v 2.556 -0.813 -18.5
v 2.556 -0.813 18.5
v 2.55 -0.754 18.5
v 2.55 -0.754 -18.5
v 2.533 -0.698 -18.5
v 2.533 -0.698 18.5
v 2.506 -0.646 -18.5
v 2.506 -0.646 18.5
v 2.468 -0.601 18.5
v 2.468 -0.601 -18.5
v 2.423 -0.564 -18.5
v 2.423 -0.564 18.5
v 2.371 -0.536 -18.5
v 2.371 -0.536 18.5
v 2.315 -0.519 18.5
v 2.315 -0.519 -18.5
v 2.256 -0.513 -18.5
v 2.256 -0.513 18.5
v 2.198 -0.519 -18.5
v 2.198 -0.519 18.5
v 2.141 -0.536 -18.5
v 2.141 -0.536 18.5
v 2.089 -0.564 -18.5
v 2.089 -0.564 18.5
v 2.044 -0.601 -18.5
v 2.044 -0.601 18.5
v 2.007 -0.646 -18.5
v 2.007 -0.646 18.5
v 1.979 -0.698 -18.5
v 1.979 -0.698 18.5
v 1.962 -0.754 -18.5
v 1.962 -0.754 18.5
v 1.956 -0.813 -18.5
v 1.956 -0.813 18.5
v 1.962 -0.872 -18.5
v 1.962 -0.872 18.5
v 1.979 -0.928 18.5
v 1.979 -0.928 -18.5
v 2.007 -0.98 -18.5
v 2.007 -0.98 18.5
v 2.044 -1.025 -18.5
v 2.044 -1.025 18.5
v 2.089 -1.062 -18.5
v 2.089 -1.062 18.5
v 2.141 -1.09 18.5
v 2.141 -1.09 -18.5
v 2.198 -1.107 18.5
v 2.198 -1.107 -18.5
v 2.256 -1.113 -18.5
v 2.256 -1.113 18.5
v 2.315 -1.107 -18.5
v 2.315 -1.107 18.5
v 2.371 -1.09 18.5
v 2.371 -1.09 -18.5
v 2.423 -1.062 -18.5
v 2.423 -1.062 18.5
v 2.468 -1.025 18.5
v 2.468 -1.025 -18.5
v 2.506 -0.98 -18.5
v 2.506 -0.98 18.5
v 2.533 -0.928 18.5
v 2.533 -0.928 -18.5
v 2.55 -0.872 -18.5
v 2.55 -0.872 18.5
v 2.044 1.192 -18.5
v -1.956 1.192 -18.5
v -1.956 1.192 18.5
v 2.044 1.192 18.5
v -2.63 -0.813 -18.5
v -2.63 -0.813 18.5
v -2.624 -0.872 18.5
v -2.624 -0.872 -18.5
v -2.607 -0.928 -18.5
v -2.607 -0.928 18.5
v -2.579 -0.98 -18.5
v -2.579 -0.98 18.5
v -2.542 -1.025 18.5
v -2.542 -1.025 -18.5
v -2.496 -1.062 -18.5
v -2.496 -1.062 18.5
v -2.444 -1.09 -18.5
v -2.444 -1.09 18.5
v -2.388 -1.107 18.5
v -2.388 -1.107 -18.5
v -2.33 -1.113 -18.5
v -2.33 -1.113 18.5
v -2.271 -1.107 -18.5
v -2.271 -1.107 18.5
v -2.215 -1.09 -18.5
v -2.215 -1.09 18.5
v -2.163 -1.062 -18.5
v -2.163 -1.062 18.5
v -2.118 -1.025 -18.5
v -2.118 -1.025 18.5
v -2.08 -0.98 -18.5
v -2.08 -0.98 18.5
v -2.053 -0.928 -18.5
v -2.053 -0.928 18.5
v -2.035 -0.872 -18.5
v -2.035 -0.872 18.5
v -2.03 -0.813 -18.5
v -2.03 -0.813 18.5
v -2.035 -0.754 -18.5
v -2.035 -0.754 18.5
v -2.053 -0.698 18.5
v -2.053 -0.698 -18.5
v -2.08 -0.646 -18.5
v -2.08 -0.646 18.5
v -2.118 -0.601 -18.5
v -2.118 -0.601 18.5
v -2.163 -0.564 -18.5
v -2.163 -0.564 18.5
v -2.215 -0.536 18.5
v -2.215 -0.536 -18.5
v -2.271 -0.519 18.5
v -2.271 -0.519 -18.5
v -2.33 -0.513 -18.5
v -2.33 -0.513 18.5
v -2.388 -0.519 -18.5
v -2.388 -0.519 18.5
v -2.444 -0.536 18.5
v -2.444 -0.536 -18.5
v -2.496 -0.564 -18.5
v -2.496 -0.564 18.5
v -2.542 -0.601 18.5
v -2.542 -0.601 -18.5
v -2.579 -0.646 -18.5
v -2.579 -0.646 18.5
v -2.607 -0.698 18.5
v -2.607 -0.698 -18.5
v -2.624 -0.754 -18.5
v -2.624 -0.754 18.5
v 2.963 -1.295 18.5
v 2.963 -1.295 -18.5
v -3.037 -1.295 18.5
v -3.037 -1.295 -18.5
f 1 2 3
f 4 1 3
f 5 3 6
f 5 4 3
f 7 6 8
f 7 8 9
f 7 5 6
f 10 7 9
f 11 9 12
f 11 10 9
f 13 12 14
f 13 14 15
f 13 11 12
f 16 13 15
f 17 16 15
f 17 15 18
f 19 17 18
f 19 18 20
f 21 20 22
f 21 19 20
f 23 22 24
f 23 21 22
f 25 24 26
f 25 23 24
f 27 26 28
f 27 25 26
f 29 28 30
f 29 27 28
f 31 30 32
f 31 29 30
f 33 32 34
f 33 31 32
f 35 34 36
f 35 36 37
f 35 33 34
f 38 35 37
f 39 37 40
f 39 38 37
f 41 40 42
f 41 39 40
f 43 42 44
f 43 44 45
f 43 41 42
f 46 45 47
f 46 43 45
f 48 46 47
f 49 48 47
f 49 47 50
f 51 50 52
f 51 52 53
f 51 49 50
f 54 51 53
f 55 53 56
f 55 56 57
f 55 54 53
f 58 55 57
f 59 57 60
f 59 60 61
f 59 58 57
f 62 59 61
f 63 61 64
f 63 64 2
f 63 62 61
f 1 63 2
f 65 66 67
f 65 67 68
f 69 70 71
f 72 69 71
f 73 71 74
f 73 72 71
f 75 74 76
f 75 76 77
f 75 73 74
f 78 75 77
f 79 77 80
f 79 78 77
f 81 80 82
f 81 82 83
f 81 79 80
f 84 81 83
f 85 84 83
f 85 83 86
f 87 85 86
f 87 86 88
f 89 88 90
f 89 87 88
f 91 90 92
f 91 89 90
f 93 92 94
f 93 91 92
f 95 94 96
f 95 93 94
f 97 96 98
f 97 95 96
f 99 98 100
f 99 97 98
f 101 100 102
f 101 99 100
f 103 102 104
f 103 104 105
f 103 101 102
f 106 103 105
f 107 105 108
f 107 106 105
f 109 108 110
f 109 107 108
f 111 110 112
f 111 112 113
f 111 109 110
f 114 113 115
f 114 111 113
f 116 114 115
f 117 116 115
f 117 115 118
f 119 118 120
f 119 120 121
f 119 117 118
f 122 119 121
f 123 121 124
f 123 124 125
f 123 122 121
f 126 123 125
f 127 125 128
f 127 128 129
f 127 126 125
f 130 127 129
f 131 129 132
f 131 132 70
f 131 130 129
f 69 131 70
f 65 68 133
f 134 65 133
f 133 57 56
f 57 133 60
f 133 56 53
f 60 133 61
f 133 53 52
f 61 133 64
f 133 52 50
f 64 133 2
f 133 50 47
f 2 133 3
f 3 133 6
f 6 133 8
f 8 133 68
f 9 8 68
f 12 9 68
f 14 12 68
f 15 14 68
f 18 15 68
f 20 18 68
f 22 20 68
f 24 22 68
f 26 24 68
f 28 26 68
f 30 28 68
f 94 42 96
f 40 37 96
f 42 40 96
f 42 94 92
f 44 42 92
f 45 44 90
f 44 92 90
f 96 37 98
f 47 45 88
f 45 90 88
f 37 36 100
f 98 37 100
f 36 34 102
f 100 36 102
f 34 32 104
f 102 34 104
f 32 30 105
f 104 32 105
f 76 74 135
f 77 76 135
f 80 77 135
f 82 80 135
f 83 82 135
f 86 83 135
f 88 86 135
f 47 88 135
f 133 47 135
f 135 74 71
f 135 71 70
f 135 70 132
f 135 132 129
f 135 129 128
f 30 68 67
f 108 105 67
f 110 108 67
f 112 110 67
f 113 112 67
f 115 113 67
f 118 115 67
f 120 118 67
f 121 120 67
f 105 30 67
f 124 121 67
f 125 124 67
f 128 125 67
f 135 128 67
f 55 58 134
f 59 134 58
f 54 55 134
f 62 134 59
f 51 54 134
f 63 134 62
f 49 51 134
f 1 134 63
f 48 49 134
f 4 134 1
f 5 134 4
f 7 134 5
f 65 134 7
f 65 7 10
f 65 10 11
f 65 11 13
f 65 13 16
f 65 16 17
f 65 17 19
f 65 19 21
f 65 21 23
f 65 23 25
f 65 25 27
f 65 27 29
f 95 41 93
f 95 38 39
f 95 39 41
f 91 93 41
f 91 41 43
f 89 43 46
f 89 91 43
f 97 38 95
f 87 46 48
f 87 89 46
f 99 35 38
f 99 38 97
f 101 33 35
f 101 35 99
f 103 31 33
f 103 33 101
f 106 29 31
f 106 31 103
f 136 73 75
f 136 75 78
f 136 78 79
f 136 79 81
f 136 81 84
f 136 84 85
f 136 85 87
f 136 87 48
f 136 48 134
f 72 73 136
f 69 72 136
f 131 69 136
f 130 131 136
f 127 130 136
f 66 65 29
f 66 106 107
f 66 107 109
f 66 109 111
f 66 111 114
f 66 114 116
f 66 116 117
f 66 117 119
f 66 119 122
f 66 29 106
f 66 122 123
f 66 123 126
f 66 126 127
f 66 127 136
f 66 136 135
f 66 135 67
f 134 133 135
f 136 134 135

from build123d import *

# Parameters (mm, degrees)
BOSS_EXTRUDE1_DEPTH      = 18.5
BOSS_EXTRUDE1_DEPTH_BACK = 18.5
SKETCH1_R                = 0.3


with BuildPart() as part:
    # Sketch1 → Boss-Extrude1 (new, two sides: drawn at the far end of the back side and taken through both)
    with BuildSketch(Plane.XY.offset(-BOSS_EXTRUDE1_DEPTH_BACK)):
        Polygon((-1.955677856, 1.191654646), (2.044322144, 1.191654646), (2.963241063, -1.294831841), (-3.036758937, -1.294831841), align=None)
        with Locations((2.256164177, -0.813020011)):
            Circle(SKETCH1_R, mode=Mode.SUBTRACT)
        with Locations((-2.329682051, -0.813020011)):
            Circle(SKETCH1_R, mode=Mode.SUBTRACT)
    extrude(amount=BOSS_EXTRUDE1_DEPTH + BOSS_EXTRUDE1_DEPTH_BACK)


solid = part.part
